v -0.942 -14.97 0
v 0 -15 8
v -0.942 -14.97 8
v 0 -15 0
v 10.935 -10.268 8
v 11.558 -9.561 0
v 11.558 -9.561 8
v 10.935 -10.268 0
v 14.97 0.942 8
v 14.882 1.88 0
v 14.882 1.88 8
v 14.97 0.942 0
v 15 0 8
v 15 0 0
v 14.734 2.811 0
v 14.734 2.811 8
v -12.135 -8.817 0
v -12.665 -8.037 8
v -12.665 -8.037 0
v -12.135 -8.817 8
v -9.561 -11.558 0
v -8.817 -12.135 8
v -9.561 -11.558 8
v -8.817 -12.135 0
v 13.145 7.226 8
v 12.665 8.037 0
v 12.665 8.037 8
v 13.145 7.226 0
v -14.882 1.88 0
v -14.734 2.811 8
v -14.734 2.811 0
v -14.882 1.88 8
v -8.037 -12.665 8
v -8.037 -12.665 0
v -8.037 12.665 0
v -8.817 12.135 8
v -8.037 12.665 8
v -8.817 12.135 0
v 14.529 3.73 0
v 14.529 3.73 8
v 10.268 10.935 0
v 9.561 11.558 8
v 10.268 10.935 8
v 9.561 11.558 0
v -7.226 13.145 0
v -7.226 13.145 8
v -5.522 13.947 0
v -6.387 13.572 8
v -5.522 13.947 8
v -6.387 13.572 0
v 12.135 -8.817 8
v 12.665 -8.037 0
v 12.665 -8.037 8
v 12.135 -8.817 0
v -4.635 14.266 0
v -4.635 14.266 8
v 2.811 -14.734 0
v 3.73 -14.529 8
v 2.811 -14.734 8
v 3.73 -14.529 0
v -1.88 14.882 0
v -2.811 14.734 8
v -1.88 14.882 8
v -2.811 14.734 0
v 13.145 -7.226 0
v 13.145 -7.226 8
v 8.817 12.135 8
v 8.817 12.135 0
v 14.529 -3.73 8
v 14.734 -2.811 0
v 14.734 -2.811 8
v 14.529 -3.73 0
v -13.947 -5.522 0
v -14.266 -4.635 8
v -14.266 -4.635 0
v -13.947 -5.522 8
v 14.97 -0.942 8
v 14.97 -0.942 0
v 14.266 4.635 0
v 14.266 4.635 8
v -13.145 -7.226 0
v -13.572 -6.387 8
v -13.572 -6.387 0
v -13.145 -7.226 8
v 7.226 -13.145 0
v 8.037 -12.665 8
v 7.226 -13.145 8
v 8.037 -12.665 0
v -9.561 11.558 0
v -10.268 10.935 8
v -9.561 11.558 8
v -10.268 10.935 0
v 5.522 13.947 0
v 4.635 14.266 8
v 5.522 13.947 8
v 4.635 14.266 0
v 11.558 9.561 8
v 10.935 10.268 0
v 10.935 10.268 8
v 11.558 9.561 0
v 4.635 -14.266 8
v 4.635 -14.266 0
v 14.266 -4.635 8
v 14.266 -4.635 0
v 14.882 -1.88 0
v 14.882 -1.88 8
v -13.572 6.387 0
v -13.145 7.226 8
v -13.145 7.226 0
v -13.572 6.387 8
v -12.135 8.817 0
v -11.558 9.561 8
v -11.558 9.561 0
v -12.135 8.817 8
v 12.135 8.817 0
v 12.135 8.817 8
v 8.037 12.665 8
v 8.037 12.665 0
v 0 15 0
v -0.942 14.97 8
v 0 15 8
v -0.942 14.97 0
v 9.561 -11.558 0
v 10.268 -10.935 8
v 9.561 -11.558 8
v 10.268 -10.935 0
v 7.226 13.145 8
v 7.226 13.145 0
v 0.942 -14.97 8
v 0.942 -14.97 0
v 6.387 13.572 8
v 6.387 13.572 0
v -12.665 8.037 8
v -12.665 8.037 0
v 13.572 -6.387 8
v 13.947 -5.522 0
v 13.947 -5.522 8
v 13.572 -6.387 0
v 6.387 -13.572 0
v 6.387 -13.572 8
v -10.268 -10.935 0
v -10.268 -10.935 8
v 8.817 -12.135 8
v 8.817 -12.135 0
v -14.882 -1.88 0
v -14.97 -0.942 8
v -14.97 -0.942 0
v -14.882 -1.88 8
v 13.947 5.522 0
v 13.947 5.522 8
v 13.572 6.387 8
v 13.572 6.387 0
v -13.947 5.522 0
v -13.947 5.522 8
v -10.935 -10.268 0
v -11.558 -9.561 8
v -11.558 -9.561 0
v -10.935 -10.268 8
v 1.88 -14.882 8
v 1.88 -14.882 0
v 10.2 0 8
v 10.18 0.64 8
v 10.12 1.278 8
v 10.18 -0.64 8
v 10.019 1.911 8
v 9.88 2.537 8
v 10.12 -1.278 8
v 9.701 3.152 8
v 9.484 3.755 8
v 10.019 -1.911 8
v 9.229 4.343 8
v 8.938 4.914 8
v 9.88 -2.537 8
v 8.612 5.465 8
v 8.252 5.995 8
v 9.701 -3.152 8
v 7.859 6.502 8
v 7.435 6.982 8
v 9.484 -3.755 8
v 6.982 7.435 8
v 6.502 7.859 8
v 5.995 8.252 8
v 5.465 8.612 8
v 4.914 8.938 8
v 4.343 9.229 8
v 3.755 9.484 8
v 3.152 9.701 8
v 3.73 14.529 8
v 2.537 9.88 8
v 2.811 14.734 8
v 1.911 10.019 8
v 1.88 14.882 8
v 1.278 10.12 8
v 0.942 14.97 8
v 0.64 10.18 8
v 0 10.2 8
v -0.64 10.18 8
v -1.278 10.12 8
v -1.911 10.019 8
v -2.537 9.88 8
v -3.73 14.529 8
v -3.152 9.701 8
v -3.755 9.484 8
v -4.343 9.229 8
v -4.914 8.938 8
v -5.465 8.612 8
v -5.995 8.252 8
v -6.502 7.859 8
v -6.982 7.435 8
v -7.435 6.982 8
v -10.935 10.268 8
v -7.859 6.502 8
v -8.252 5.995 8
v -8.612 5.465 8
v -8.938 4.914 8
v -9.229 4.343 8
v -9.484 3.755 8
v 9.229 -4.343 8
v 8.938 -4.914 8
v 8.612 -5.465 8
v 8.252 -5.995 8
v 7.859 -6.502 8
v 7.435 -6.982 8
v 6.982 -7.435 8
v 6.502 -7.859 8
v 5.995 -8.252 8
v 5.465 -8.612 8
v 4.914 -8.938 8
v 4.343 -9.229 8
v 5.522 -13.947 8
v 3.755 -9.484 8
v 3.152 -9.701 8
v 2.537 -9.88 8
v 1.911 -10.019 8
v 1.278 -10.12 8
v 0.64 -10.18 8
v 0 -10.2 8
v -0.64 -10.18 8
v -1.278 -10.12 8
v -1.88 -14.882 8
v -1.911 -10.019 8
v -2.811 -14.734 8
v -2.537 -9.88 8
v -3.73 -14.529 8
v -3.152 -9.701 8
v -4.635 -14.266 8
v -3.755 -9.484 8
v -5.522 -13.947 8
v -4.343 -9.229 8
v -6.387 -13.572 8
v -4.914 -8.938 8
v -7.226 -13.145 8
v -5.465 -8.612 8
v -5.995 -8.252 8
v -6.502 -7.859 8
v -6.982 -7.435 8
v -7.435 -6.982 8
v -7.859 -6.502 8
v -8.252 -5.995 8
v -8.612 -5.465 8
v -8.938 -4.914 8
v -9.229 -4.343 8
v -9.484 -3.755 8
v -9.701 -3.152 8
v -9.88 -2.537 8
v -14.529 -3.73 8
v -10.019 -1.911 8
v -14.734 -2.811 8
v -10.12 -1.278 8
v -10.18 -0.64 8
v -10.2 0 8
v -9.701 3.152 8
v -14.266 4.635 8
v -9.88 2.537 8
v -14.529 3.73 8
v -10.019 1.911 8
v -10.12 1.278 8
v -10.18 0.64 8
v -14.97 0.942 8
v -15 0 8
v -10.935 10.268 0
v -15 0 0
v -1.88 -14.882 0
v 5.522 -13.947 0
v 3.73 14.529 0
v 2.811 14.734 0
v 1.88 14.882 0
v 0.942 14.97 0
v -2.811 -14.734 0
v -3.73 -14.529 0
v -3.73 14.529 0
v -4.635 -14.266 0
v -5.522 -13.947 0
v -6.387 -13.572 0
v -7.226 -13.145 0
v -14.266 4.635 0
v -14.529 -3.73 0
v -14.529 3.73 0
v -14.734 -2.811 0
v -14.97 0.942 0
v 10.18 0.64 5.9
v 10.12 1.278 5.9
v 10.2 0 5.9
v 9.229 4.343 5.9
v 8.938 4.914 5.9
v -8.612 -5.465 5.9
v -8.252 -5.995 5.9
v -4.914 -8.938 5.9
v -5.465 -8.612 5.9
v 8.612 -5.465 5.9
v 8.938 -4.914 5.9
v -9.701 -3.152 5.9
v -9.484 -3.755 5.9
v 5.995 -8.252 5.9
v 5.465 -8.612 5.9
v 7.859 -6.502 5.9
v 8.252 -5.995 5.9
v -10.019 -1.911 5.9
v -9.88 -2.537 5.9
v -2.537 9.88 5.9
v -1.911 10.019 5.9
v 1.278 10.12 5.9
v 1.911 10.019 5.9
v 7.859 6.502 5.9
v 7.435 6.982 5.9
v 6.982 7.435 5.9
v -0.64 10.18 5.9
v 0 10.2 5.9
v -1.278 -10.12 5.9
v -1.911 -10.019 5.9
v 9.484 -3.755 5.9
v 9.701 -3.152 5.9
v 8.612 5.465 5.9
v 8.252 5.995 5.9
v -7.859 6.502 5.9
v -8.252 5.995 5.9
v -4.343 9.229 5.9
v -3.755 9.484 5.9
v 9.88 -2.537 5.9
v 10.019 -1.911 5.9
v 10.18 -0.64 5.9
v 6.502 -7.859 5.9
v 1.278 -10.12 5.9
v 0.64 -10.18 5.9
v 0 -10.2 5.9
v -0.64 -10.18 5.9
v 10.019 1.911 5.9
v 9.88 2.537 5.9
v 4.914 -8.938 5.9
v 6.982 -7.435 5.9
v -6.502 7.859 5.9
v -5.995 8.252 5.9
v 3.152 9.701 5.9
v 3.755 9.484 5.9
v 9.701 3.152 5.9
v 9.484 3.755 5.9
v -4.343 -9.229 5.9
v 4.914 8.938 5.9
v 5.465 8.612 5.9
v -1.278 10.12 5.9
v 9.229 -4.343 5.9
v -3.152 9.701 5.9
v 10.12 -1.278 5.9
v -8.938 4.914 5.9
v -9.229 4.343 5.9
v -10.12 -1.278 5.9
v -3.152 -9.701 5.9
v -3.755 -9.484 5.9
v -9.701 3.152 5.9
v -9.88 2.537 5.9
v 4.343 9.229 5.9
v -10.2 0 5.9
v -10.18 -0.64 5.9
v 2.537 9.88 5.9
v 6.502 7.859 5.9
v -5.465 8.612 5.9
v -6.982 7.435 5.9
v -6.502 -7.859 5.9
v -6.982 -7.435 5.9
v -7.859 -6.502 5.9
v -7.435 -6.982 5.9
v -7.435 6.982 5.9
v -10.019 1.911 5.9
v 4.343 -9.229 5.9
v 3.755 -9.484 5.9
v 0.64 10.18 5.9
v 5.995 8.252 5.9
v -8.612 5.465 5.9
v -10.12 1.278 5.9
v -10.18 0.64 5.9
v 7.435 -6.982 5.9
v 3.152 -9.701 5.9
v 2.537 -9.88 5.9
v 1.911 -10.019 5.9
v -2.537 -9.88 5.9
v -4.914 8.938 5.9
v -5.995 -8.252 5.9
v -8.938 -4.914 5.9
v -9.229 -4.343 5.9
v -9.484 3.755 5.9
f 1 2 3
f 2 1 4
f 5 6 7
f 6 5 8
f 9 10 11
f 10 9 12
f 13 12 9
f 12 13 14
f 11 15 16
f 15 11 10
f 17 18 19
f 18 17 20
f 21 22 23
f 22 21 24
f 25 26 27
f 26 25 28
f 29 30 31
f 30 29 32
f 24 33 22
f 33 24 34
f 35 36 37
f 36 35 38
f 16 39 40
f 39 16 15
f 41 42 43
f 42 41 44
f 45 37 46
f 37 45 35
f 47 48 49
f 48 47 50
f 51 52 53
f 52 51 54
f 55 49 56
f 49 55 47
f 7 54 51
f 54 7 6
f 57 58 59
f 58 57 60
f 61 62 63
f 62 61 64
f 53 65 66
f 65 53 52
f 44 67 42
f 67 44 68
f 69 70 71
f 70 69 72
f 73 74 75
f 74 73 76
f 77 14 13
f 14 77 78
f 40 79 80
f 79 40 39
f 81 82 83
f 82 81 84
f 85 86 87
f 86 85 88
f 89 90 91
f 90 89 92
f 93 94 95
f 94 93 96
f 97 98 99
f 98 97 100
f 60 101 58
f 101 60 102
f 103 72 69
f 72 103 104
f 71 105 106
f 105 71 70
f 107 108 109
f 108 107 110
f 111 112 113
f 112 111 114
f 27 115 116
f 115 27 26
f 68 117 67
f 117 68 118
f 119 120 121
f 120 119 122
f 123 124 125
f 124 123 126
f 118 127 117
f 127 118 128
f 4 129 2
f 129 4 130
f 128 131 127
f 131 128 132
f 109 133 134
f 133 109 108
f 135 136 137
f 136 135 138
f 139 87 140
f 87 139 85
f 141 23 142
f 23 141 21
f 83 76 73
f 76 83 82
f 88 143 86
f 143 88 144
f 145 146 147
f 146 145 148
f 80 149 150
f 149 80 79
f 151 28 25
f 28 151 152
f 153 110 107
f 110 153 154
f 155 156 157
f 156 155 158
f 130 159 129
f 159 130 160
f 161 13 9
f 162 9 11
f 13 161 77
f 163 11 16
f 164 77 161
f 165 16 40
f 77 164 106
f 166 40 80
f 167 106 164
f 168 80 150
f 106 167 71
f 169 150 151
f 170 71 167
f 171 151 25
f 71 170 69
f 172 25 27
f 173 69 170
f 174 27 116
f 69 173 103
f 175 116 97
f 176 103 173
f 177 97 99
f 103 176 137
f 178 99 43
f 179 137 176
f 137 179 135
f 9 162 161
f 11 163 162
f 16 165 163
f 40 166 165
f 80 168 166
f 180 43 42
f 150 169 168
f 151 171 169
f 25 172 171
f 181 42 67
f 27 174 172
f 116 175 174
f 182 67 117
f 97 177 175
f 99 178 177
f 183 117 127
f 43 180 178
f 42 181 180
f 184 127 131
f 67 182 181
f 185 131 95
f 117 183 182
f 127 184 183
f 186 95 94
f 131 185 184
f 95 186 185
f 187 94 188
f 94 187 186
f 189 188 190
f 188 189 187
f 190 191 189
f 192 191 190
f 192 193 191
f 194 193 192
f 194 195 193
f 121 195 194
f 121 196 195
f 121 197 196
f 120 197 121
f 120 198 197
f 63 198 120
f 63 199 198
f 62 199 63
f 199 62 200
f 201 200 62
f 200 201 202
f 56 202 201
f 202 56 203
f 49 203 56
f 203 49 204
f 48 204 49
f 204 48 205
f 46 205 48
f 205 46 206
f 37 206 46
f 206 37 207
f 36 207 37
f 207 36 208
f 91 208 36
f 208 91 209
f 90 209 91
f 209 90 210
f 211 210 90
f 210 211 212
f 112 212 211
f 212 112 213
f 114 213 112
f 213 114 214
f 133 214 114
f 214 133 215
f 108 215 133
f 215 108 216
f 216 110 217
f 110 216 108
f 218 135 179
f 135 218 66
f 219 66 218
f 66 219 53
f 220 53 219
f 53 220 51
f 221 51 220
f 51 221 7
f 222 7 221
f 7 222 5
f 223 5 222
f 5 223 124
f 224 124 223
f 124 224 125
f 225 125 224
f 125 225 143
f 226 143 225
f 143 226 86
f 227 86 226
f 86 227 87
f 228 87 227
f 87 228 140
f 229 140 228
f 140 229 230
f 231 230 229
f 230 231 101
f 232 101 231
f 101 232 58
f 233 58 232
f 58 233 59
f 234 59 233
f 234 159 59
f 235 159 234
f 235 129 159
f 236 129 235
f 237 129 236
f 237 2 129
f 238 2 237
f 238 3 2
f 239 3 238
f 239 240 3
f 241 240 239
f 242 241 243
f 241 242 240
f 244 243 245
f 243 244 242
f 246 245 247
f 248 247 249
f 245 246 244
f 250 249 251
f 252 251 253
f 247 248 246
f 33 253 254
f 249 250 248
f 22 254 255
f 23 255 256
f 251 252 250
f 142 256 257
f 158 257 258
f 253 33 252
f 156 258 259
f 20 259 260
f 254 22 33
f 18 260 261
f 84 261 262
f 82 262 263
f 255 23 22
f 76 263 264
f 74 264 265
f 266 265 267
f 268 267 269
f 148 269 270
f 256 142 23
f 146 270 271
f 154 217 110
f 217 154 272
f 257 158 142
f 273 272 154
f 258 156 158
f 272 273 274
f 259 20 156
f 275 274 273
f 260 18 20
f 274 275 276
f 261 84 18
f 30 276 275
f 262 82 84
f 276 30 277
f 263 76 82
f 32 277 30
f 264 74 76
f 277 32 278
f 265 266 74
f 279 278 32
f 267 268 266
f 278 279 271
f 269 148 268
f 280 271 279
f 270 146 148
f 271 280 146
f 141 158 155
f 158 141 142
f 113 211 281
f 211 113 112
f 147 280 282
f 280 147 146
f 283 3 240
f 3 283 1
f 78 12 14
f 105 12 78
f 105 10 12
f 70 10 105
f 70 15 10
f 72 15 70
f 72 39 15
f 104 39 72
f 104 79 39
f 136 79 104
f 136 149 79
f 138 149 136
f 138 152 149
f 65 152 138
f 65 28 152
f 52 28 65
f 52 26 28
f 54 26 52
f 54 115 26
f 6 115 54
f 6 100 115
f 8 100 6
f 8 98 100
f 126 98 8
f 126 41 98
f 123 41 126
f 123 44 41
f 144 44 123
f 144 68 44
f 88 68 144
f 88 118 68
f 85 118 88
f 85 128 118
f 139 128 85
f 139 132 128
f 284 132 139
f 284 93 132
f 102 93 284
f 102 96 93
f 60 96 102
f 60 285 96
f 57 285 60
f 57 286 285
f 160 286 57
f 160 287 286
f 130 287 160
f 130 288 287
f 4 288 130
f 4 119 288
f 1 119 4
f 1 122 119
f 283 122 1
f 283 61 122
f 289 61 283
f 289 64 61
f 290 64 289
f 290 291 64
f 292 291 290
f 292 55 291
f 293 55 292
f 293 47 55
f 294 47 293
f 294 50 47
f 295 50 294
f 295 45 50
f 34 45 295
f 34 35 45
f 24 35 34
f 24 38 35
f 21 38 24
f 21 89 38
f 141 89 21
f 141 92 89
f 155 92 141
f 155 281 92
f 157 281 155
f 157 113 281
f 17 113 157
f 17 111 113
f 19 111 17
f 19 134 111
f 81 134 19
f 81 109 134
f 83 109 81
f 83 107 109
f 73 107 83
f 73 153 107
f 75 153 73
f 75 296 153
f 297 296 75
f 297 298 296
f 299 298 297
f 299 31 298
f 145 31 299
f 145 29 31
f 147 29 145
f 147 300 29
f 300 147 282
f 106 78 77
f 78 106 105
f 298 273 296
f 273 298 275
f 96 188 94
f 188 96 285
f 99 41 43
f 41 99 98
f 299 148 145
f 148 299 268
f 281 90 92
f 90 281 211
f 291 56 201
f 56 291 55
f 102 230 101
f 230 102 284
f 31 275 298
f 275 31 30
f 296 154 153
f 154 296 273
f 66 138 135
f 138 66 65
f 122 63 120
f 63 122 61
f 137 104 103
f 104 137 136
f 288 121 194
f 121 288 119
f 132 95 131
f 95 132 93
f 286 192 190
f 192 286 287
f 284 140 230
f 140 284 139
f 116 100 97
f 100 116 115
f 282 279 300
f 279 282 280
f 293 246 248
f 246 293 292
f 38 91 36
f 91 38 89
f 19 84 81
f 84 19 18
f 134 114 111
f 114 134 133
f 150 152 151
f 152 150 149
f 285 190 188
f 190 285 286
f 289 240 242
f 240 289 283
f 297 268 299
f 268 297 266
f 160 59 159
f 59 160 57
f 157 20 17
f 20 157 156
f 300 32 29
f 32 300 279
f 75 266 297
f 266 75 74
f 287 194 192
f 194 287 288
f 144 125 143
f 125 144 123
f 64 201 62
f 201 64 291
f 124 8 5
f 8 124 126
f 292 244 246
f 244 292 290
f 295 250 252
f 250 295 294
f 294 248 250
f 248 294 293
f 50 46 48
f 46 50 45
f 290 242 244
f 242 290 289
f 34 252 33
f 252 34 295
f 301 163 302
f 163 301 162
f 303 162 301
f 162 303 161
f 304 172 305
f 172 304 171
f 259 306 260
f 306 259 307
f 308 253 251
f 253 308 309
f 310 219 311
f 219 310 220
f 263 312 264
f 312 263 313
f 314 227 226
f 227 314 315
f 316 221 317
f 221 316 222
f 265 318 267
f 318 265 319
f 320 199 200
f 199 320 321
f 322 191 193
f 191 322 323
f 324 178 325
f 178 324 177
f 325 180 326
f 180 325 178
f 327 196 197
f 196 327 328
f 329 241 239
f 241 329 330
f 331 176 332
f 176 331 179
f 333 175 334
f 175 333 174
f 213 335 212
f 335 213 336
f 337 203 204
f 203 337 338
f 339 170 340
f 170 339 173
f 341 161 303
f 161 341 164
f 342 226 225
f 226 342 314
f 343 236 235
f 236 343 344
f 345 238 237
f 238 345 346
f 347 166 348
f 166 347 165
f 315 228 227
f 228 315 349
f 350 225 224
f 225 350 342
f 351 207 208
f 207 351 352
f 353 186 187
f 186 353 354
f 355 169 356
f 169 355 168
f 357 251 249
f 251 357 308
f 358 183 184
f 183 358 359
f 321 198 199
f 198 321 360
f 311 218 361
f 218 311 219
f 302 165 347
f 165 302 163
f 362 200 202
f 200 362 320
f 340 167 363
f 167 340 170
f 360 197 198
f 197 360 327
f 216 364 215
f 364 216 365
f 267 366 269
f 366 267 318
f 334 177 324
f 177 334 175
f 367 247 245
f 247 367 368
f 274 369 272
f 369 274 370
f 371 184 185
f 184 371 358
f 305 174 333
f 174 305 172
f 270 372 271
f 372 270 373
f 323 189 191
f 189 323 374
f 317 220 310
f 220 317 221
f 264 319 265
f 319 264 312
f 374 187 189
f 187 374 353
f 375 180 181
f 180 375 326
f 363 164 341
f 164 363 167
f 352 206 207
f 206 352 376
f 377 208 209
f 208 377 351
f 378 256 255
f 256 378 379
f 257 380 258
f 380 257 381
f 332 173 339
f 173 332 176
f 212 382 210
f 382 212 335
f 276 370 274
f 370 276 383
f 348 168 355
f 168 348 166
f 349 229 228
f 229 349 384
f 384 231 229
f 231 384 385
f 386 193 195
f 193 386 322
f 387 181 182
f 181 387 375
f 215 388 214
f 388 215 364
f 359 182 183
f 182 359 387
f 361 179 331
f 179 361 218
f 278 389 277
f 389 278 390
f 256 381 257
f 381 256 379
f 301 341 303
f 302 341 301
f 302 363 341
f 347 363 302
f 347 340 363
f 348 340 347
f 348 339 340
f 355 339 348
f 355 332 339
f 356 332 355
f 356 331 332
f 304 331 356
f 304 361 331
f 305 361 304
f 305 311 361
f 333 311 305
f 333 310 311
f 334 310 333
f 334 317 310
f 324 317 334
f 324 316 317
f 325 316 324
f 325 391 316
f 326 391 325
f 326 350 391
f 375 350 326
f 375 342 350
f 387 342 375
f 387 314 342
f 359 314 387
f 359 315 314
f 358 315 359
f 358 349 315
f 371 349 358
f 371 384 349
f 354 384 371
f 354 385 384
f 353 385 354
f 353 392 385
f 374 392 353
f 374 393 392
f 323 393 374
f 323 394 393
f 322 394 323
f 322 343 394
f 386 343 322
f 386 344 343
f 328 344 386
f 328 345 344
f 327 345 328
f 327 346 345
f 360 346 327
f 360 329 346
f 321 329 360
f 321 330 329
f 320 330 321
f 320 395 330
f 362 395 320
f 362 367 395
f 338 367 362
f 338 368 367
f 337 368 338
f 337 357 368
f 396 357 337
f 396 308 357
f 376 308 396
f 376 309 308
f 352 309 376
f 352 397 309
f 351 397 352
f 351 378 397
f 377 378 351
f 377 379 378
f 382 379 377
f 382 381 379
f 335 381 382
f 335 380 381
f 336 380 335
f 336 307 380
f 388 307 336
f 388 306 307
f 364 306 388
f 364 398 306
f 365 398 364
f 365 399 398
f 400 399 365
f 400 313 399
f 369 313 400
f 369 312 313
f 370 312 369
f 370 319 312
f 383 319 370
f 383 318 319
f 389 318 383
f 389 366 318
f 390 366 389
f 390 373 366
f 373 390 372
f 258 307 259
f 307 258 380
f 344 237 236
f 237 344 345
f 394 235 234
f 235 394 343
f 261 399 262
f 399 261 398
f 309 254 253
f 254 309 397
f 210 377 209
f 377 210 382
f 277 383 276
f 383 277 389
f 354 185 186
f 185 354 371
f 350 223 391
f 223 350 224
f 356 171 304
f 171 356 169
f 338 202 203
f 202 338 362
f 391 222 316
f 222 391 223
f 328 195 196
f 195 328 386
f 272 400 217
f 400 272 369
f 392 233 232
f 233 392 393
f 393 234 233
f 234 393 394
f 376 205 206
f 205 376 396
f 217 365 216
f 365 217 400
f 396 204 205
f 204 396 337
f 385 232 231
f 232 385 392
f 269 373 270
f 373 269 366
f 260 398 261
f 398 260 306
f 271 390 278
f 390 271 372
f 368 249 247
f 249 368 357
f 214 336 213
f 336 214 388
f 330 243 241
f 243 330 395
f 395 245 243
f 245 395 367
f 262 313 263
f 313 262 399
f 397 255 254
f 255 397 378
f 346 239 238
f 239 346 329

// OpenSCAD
//The body height in mm.
Body_height = 8;
//The body diamter in mm.
Body_diameter = 30;
//Thickness of the magnet in mm.
Magnet_thickness = 2;
//Diamter of the magnet in mm.
Magnet_diameter = 20;
//Magnet height
Height_tolerance = 0.1;
//Magnet diameter
Diameter_tolerance = 0.2;
//Model resolution
Resolution = 100;

difference(){
    //Main body
    cylinder(h=Body_height, d=Body_diameter, $fn = Resolution);
        translate([0,0,Body_height-Magnet_thickness-Height_tolerance]) 
            //Hollow out
            cylinder(h=Magnet_thickness+1, d=Magnet_diameter+(Diameter_tolerance*2), $fn = Resolution);    
    
}
